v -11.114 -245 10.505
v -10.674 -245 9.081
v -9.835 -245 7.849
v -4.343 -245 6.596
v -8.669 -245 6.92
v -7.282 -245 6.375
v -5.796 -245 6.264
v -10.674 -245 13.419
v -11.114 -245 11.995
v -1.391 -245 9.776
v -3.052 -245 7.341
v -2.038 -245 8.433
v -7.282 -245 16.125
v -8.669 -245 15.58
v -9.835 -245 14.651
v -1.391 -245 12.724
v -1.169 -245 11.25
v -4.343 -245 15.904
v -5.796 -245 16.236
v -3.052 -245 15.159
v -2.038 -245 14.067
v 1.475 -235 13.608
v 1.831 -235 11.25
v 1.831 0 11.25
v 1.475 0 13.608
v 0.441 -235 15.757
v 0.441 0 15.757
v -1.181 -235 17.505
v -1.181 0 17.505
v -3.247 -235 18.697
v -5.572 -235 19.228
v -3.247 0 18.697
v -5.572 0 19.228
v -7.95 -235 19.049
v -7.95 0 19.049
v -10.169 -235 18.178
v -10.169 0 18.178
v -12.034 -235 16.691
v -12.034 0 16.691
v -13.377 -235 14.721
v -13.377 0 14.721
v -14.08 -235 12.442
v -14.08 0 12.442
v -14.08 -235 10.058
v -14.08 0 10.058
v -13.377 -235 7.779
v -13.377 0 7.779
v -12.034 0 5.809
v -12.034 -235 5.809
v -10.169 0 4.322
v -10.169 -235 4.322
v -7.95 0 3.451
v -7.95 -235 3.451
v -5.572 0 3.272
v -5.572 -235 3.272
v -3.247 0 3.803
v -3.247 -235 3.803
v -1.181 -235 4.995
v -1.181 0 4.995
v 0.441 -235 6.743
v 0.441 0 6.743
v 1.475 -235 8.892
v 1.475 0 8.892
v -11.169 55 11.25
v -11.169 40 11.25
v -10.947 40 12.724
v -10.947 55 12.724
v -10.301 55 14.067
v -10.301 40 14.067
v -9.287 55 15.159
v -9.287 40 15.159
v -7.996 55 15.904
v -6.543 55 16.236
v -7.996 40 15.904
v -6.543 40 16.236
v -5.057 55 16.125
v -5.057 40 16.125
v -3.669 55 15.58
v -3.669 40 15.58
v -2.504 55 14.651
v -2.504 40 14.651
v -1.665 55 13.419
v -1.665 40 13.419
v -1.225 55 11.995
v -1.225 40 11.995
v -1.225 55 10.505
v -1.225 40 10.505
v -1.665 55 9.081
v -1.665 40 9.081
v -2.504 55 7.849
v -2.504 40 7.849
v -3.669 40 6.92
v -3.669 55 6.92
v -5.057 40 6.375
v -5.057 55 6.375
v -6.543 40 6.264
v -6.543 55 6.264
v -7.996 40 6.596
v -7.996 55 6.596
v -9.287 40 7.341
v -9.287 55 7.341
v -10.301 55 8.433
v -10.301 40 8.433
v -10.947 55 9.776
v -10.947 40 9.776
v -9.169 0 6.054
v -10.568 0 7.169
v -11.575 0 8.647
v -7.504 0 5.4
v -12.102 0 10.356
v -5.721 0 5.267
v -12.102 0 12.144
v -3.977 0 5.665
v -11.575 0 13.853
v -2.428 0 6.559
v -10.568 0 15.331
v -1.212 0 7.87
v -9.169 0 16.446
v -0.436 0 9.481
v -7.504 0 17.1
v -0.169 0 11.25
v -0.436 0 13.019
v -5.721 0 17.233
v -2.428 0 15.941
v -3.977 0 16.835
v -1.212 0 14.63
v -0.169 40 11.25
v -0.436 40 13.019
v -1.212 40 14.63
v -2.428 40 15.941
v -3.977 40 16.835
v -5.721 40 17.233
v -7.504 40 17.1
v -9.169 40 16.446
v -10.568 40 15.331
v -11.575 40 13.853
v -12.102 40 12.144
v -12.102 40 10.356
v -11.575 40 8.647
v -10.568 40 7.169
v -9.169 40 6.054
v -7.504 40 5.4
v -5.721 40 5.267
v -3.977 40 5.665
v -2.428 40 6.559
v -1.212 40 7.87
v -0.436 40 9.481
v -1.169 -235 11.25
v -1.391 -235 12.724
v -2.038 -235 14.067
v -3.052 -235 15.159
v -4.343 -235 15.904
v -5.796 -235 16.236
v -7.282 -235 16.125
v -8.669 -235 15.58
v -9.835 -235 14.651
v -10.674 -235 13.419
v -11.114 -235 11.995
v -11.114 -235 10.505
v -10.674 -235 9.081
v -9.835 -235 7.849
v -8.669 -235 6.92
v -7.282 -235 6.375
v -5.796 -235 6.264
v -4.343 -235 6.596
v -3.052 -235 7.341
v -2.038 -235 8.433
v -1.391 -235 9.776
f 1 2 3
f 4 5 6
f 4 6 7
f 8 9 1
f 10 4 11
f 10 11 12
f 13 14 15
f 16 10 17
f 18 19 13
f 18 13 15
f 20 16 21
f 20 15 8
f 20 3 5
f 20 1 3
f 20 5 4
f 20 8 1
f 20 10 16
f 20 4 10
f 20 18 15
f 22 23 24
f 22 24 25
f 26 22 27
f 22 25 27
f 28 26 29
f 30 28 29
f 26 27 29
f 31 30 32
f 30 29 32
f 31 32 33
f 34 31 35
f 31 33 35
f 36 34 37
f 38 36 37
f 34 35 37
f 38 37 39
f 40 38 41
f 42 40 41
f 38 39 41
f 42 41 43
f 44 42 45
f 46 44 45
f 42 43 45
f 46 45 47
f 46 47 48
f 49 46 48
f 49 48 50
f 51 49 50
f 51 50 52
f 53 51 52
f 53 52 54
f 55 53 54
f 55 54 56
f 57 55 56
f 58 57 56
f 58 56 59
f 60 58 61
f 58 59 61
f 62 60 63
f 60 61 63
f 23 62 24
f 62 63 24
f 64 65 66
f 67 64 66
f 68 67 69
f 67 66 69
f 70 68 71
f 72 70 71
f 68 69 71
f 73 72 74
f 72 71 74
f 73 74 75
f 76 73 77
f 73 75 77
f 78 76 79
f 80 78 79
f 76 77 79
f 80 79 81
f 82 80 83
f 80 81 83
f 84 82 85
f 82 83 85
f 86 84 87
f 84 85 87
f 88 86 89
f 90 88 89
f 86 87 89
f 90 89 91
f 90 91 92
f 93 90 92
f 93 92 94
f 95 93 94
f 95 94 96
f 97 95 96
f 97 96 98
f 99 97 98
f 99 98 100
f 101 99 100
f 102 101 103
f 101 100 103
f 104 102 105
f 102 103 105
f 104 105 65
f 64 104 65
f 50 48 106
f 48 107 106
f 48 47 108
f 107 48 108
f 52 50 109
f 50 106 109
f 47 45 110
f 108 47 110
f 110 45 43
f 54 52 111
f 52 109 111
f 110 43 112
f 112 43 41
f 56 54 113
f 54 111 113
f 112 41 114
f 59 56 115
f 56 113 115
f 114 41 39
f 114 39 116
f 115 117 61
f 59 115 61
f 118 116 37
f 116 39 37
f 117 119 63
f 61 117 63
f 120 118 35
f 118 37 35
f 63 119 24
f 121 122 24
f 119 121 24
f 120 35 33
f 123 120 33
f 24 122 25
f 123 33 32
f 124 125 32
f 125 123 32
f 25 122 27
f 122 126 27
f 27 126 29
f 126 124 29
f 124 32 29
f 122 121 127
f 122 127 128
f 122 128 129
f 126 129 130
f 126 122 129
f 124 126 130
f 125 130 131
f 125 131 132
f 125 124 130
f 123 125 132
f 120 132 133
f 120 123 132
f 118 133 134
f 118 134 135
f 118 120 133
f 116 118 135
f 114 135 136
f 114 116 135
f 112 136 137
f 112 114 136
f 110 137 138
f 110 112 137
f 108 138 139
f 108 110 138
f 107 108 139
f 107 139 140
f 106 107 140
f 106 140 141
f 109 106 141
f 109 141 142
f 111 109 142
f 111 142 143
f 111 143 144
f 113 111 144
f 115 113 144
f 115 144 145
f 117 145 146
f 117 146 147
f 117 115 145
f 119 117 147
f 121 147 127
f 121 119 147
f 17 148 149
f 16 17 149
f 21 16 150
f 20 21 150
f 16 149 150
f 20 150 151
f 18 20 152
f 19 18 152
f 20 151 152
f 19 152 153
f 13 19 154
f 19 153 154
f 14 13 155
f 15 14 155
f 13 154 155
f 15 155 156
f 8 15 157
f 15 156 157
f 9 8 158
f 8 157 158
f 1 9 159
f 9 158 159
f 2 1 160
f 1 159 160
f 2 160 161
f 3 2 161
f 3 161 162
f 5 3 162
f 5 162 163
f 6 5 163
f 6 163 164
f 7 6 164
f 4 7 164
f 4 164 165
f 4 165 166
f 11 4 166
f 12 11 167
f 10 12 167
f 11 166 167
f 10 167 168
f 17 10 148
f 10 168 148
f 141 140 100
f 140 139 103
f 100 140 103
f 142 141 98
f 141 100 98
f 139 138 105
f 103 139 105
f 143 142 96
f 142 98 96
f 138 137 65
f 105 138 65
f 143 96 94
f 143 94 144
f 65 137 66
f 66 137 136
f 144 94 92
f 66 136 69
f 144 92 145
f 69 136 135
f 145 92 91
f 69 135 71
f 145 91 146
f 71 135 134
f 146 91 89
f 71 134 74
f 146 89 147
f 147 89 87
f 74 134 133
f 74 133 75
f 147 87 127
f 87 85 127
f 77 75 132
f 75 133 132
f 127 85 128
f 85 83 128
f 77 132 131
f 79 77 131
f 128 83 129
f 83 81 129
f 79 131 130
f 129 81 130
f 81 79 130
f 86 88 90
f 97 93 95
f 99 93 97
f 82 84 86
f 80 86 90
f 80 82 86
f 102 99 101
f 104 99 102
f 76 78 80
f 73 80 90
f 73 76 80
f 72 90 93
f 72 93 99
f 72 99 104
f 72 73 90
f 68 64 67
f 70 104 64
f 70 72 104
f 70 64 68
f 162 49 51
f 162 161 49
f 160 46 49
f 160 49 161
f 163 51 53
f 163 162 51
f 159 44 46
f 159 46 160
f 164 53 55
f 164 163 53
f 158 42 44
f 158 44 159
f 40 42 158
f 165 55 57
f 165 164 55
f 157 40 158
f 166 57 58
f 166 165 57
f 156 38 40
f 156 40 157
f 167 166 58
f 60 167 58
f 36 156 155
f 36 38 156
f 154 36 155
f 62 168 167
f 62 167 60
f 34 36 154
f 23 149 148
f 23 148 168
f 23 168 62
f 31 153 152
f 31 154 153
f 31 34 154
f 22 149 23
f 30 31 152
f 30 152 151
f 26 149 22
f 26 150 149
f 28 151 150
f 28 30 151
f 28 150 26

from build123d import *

# Parameters (mm, degrees)
F0_R     = 8
F0_R_2   = 6
F0_R_3   = 5
F1_DEPTH = 235
F2_DEPTH = 40
F3_R     = 5
F4_DEPTH = 15
F5_R     = 5
F6_DEPTH = 10


with BuildPart() as f1:
    # F0 (on Front) → F1 (new body)
    with BuildSketch(Plane.XZ):
        with Locations((-6.1693550088, 11.2500013784)):
            Circle(F0_R)
        with Locations((-6.1693550088, 11.2500013784)):
            Circle(F0_R_2, mode=Mode.SUBTRACT)
        with Locations((-6.1693550088, 11.2500013784)):
            Circle(F0_R_2)
        with Locations((-6.1693550088, 11.2500013784)):
            Circle(F0_R_3, mode=Mode.SUBTRACT)
        with Locations((-6.1693550088, 11.2500013784)):
            Circle(F0_R_3)
    extrude(amount=F1_DEPTH)

    # F0 (on Front) → F2 (join)
    with BuildSketch(Plane.XZ):
        with Locations((-6.1693550088, 11.2500013784)):
            Circle(F0_R_2)
        with Locations((-6.1693550088, 11.2500013784)):
            Circle(F0_R_3, mode=Mode.SUBTRACT)
        with Locations((-6.1693550088, 11.2500013784)):
            Circle(F0_R_3)
    extrude(amount=-F2_DEPTH)

    # F3 (on face) → F4 (join)
    with BuildSketch(Plane(origin=(0, 40, 0), x_dir=(-1, 0, 0), z_dir=(0, 1, 0))):
        with Locations((6.1693550088, 11.2500013784)):
            Circle(F3_R)
    extrude(amount=F4_DEPTH)

    # F5 (on face) → F6 (join)
    with BuildSketch(Plane.XZ.offset(235)):
        with Locations((-6.1693550088, 11.2500013784)):
            Circle(F5_R)
    extrude(amount=F6_DEPTH)


solid = f1.part
